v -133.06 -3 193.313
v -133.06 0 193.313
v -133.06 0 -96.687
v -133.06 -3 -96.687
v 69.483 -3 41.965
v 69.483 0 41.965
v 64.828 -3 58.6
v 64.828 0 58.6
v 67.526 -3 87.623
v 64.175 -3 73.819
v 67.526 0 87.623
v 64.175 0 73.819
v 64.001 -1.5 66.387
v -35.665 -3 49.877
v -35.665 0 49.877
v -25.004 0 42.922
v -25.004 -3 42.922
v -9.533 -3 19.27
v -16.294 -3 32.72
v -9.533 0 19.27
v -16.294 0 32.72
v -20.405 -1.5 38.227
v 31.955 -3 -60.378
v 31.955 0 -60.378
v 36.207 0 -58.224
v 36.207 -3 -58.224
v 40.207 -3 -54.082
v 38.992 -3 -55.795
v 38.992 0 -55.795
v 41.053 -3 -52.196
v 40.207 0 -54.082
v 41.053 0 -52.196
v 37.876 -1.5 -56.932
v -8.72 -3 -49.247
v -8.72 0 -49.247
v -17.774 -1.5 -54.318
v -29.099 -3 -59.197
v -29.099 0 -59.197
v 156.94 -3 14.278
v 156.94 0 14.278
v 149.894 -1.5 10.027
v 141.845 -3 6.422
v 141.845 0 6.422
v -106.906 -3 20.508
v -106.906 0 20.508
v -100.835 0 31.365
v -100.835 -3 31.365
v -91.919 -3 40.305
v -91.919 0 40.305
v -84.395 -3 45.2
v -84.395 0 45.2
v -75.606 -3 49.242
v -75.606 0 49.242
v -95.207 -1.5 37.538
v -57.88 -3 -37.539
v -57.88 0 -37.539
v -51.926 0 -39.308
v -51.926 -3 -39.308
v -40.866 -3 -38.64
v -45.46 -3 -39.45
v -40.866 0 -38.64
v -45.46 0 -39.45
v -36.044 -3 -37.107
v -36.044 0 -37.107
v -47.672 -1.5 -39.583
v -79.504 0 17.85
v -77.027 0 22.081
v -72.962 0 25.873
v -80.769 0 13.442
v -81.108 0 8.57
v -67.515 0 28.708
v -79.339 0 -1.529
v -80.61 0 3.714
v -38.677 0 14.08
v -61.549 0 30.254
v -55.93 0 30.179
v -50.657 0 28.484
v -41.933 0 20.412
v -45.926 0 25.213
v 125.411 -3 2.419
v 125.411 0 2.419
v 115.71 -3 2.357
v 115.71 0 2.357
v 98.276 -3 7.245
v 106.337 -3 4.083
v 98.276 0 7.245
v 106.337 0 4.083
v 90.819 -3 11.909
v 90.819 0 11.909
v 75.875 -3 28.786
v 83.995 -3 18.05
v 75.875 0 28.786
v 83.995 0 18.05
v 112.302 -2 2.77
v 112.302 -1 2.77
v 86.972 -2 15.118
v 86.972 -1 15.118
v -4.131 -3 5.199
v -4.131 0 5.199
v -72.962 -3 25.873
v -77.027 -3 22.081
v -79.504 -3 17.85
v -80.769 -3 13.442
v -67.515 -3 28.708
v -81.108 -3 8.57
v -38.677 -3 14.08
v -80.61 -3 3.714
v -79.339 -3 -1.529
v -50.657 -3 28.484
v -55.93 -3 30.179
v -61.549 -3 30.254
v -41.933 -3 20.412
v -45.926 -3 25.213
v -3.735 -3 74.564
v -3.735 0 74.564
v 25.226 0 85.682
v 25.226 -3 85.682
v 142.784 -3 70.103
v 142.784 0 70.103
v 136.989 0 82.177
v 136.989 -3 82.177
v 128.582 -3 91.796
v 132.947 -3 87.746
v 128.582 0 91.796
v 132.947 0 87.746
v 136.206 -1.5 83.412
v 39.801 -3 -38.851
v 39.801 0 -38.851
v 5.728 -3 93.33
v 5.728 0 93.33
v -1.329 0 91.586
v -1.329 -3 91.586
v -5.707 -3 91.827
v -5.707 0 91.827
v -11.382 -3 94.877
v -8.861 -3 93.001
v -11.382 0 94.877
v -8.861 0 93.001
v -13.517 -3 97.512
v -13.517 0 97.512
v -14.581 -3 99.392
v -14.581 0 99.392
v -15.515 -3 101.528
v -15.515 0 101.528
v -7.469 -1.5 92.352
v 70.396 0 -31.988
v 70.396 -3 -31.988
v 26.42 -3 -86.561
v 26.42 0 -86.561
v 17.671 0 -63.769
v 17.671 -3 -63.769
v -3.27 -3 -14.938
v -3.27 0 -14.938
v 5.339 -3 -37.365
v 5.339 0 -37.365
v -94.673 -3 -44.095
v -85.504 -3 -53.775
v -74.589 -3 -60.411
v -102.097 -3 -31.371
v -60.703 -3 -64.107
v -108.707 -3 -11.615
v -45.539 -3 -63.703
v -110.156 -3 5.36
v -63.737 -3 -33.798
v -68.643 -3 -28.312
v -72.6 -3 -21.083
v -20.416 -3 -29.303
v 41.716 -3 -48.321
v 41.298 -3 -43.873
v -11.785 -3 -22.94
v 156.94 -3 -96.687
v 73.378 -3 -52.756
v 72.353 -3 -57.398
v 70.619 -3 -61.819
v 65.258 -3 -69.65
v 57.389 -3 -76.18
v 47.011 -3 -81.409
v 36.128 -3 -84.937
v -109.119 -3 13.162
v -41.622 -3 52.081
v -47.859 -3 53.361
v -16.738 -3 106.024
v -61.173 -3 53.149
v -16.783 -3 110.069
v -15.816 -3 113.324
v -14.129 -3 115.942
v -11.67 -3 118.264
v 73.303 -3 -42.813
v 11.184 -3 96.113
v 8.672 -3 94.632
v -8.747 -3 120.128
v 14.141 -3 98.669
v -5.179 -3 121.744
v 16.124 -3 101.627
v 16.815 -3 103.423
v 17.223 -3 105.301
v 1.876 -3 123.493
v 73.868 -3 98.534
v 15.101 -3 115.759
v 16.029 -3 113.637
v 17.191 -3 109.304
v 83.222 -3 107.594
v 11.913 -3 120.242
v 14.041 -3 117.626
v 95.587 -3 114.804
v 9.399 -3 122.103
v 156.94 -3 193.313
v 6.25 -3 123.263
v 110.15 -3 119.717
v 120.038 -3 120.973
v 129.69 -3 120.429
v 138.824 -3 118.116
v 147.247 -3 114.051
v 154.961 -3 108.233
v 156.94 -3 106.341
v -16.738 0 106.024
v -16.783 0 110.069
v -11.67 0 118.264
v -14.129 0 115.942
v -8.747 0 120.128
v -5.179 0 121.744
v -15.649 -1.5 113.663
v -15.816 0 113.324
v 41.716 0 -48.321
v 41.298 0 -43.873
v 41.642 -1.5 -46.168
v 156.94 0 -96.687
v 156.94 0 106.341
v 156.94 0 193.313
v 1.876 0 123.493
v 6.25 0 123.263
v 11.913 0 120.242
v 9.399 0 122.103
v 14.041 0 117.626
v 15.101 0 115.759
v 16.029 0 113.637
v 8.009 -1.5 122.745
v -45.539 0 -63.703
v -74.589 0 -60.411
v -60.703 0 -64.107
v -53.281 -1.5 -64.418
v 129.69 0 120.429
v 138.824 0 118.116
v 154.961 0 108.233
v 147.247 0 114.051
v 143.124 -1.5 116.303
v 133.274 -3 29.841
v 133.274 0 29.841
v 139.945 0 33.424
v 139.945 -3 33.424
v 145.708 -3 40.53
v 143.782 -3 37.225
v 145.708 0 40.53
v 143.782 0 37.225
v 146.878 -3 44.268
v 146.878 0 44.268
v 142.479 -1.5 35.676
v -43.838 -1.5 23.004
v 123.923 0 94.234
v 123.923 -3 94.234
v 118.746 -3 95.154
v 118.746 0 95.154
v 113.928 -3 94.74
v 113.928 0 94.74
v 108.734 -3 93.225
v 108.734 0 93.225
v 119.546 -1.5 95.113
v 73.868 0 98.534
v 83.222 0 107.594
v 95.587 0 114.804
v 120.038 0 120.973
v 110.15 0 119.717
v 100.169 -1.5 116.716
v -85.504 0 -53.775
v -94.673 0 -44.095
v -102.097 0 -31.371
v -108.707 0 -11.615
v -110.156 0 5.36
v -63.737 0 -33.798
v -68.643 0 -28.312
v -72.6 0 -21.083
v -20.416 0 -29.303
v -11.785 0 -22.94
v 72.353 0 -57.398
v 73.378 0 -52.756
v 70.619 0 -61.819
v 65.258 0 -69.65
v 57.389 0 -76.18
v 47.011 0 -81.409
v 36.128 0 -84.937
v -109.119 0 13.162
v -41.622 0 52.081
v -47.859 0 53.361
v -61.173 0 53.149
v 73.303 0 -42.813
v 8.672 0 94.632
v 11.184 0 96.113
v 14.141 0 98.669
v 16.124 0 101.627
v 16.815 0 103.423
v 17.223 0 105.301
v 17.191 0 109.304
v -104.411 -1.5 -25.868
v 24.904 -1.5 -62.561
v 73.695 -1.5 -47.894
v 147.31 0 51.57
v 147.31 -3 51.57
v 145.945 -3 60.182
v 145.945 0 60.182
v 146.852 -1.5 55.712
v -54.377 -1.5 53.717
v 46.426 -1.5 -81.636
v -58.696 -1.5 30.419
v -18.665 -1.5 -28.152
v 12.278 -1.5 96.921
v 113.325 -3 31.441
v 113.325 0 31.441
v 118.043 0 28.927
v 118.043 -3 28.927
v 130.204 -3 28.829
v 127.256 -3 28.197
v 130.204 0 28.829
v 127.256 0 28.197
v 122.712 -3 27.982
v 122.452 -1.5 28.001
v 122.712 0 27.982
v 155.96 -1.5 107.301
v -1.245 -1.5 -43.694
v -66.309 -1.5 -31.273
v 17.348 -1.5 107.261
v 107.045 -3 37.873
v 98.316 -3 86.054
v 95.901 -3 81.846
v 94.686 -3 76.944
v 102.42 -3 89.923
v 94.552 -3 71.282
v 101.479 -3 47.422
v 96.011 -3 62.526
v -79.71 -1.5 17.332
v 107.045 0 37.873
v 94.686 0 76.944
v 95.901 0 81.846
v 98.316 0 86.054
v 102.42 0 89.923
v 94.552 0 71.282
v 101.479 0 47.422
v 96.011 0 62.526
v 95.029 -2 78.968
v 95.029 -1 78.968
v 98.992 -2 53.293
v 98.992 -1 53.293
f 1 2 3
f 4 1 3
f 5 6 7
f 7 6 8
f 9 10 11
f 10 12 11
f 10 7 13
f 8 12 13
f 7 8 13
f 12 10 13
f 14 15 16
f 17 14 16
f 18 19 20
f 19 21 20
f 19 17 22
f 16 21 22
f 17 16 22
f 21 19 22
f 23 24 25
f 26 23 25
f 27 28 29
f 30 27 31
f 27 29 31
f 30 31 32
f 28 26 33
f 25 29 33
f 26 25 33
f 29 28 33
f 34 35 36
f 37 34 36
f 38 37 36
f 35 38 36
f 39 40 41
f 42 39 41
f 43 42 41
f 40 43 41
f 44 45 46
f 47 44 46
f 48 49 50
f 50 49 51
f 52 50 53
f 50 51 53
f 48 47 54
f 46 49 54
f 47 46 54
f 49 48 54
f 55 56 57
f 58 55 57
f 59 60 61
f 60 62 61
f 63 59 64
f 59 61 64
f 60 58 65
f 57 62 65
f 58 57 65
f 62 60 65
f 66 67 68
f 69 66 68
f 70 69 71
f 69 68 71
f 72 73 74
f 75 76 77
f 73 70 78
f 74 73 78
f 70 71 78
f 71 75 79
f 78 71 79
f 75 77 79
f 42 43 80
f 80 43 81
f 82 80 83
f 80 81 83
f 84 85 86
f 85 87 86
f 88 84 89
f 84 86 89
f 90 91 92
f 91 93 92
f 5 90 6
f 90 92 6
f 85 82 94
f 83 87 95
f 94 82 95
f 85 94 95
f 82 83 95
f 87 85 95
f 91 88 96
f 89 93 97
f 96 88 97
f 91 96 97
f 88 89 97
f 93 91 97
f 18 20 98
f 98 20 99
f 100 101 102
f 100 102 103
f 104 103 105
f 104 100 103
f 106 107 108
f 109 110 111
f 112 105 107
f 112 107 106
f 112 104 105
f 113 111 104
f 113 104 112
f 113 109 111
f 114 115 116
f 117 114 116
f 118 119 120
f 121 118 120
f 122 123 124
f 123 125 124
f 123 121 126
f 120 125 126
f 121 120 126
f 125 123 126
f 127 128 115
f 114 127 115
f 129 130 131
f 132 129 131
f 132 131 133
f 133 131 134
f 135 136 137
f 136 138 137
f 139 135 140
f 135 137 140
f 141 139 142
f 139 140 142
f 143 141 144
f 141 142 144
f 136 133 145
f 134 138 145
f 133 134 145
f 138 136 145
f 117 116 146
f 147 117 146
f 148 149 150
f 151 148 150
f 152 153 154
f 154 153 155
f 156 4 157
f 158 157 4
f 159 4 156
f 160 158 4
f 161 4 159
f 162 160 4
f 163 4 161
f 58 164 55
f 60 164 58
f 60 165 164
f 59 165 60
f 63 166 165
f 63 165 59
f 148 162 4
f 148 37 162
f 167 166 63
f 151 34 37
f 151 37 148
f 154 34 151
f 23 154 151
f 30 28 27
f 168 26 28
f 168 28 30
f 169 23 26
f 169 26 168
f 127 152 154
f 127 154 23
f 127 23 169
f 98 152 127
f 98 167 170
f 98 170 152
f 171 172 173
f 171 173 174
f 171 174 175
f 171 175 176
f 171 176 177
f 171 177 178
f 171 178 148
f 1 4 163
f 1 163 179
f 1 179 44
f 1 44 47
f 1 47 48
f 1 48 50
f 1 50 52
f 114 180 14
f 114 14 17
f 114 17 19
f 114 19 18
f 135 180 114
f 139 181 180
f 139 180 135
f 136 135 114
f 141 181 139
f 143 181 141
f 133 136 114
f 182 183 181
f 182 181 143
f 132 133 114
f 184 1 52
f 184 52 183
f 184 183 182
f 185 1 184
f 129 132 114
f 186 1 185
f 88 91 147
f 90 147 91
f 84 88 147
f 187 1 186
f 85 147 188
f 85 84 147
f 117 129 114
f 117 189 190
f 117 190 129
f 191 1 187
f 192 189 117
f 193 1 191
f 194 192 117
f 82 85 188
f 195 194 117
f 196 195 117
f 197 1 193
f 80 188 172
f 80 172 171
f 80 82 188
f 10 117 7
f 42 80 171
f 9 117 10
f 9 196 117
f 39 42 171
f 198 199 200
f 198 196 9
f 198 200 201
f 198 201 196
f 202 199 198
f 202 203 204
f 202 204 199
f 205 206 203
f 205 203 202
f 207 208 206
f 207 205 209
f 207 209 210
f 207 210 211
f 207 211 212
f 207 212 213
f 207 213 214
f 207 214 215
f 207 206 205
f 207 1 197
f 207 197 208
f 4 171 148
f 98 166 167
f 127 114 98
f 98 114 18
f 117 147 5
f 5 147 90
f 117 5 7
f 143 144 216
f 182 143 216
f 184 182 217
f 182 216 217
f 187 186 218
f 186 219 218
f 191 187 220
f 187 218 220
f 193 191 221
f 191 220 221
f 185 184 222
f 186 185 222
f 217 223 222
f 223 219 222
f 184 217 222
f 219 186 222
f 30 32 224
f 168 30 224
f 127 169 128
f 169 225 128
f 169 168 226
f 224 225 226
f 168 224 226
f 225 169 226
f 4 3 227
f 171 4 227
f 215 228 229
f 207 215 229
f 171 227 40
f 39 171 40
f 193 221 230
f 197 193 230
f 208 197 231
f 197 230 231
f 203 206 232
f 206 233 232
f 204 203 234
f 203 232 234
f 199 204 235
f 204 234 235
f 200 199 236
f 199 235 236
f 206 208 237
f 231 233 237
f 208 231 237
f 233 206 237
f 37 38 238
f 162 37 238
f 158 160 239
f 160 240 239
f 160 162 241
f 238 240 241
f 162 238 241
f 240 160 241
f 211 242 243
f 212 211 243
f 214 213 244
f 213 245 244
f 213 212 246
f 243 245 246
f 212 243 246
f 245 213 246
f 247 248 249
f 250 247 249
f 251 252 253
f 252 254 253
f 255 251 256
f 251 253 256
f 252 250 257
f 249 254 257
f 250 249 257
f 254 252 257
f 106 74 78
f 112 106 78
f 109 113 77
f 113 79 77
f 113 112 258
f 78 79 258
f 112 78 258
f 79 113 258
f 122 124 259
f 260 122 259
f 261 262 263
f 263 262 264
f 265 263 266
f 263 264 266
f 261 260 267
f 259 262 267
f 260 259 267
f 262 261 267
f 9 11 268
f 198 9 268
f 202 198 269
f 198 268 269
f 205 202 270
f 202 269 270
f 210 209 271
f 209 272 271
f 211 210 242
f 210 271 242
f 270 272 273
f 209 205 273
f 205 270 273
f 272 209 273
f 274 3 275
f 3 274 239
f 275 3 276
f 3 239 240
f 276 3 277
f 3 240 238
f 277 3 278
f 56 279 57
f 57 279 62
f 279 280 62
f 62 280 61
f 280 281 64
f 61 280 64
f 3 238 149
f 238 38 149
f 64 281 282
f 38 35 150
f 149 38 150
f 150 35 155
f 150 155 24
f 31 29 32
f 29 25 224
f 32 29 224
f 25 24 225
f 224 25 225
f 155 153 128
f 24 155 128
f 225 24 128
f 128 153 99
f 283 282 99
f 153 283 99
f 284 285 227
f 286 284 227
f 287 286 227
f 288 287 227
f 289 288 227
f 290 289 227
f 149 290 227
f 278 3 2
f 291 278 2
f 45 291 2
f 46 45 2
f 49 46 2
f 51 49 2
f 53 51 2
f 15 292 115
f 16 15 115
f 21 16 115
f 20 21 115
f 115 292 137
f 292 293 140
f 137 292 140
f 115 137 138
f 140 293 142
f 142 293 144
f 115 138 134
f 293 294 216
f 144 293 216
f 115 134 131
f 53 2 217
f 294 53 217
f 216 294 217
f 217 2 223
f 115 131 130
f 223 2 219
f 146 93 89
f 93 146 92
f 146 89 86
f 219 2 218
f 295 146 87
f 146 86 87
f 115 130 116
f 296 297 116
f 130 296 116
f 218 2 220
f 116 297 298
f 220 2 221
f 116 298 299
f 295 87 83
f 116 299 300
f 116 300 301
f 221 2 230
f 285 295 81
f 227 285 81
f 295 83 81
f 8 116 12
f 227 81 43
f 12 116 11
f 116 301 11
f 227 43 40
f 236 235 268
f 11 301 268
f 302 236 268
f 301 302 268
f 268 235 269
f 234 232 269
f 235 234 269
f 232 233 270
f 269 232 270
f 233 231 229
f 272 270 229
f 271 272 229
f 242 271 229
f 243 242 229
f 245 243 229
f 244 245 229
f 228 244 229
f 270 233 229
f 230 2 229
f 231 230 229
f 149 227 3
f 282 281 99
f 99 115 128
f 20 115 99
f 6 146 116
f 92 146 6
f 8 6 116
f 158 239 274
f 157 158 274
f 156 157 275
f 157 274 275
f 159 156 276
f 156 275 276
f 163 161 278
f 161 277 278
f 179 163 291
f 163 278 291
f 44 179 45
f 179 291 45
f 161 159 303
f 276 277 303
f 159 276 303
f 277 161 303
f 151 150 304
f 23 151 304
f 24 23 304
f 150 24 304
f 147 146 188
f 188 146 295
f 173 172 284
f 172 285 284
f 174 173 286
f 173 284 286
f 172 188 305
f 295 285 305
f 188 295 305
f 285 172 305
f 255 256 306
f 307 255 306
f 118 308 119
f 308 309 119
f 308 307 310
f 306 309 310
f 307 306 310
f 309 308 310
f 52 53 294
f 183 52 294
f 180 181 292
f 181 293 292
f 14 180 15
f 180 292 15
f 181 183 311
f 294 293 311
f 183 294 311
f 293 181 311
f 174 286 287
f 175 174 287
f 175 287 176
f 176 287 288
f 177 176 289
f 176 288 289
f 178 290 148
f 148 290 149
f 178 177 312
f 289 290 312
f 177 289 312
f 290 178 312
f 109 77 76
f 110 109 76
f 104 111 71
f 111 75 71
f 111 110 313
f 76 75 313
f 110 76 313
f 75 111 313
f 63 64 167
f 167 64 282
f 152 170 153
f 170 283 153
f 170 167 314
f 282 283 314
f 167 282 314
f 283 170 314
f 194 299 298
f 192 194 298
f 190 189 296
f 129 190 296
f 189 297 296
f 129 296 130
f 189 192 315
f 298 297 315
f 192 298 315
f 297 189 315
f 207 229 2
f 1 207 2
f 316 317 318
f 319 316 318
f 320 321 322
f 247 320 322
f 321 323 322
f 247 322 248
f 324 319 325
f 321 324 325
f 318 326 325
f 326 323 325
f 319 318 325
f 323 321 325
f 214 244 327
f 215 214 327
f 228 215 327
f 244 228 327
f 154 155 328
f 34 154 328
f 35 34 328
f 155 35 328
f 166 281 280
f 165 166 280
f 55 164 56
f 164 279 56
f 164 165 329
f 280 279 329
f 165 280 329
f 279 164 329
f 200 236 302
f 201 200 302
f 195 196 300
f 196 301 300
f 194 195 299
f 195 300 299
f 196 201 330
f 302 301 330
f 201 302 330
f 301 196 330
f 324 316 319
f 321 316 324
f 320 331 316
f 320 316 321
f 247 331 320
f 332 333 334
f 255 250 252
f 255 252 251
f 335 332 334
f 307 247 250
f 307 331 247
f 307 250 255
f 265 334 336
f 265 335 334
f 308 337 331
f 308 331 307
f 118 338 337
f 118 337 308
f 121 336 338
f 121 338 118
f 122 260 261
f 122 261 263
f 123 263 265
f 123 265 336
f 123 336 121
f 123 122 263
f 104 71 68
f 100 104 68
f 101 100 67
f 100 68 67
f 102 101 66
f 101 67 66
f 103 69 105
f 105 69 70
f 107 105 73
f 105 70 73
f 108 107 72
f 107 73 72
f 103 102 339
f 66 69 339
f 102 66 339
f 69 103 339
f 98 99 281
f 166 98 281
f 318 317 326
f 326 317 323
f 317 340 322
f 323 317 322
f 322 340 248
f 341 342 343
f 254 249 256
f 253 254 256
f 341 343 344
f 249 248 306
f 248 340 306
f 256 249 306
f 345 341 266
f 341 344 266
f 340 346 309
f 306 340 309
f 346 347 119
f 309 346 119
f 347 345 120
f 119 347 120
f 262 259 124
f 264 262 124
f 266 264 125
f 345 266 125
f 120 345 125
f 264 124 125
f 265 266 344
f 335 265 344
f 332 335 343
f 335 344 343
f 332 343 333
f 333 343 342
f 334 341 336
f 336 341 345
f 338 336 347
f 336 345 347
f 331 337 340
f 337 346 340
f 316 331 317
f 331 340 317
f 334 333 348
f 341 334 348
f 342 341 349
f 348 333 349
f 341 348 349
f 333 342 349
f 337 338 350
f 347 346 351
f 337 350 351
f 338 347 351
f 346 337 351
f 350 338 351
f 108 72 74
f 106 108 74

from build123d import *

# Parameters (mm, degrees)
F1_DEPTH = 3


with BuildPart() as f1:
    # F0 (on Front) → F1 (new body)
    with BuildSketch(Plane.XZ):
        with BuildLine():
            Line((156.9402193278, 193.3127623796), (-133.0597806722, 193.3127623796))
            Line((-133.0597806722, 193.3127623796), (-133.0597806722, -96.6872376204))
            Line((-133.0597806722, -96.6872376204), (156.9402193278, -96.6872376204))
            Line((156.9402193278, -96.6872376204), (156.9402193278, 14.2779064416))
            add(Edge.make_bspline(
                [(156.9402193278, 14.2779064416), (150.3960401846, 9.7043804493), (141.8449614262, 6.4219288531)],
                knots=[0.6495913367, 0.6495913367, 0.6495913367, 1, 1, 1], degree=2))
            add(Edge.make_bspline(
                [(141.8449614262, 6.4219288531), (126.5587975418, 0.5541203043), (112.3015772663, 2.7696804424)],
                knots=[0, 0, 0, 1, 1, 1], degree=2))
            add(Edge.make_bspline(
                [(112.3015772663, 2.7696804424), (98.0443569908, 4.9852405805), (86.9719498604, 15.1179921535)],
                knots=[0, 0, 0, 1, 1, 1], degree=2))
            add(Edge.make_bspline(
                [(86.9719498604, 15.1179921535), (75.89954273, 25.2507437265), (69.4834498834, 41.9652370395)],
                knots=[0, 0, 0, 1, 1, 1], degree=2))
            add(Edge.make_bspline(
                [(69.4834498834, 41.9652370395), (59.4976762893, 67.979066632), (67.5256347657, 87.623011686)],
                knots=[0, 0, 0, 1, 1, 1], degree=2))
            add(Edge.make_bspline(
                [(67.5256347657, 87.623011686), (75.5535932422, 107.2669567399), (100.169483394, 116.7161116596)],
                knots=[0, 0, 0, 1, 1, 1], degree=2))
            add(Edge.make_bspline(
                [(100.169483394, 116.7161116596), (115.4556472784, 122.5839202085), (129.6895363071, 120.429140046)],
                knots=[0, 0, 0, 1, 1, 1], degree=2))
            add(Edge.make_bspline(
                [(129.6895363071, 120.429140046), (143.9234253359, 118.2743598836), (154.9608355962, 108.2327782741)],
                knots=[0, 0, 0, 1, 1, 1], degree=2))
            add(Edge.make_bspline(
                [(154.9608355962, 108.2327782741), (155.9698376052, 107.3148114886), (156.9402193278, 106.3410792713)],
                knots=[0, 0, 0, 0.0914165538, 0.0914165538, 0.0914165538], degree=2))
            Line((156.9402193278, 106.3410792713), (156.9402193278, 193.3127623796))
        make_face()
        with BuildLine():
            add(Edge.make_bspline(
                [(-8.7196716461, -49.2474706648), (-16.6388251683, -54.4142969567), (-29.0987201834, -59.1972025333)],
                knots=[0, 0, 0, 1, 1, 1], degree=2))
            add(Edge.make_bspline(
                [(-29.0987201834, -59.1972025333), (-54.717479934, -69.0313230238), (-74.5889046434, -60.4107597844)],
                knots=[0, 0, 0, 1, 1, 1], degree=2))
            add(Edge.make_bspline(
                [(-74.5889046434, -60.4107597844), (-94.4603293529, -51.790196545), (-104.4111060769, -25.8675369161)],
                knots=[0, 0, 0, 1, 1, 1], degree=2))
            add(Edge.make_bspline(
                [(-104.4111060769, -25.8675369161), (-114.6535233849, 0.814872409), (-106.9059851223, 20.508080233)],
                knots=[0, 0, 0, 1, 1, 1], degree=2))
            add(Edge.make_bspline(
                [(-106.9059851223, 20.508080233), (-99.1584468598, 40.2012880571), (-75.6062062824, 49.2421461593)],
                knots=[0, 0, 0, 1, 1, 1], degree=2))
            add(Edge.make_bspline(
                [(-75.6062062824, 49.2421461593), (-53.1176152796, 57.8747074439), (-35.6646850497, 49.8773972036)],
                knots=[0, 0, 0, 1, 1, 1], degree=2))
            add(Edge.make_bspline(
                [(-35.6646850497, 49.8773972036), (-18.2117548197, 41.8800869633), (-9.5325310417, 19.2699360091)],
                knots=[0, 0, 0, 1, 1, 1], degree=2))
            Line((-9.5325310417, 19.2699360091), (-4.1313474271, 5.1993716384))
            Line((-4.1313474271, 5.1993716384), (-72.5999900345, -21.0832777863))
            add(Edge.make_bspline(
                [(-72.5999900345, -21.0832777863), (-67.3775071458, -33.2349628763), (-57.8799977559, -37.5391148487)],
                knots=[0, 0, 0, 1, 1, 1], degree=2))
            add(Edge.make_bspline(
                [(-57.8799977559, -37.5391148487), (-48.382488366, -41.8432668212), (-36.0441533023, -37.107023738)],
                knots=[0, 0, 0, 1, 1, 1], degree=2))
            add(Edge.make_bspline(
                [(-36.0441533023, -37.107023738), (-26.4409171443, -33.420686757), (-18.6654288907, -28.1521023899)],
                knots=[0, 0, 0, 1, 1, 1], degree=2))
            add(Edge.make_bspline(
                [(-18.6654288907, -28.1521023899), (-10.8899406371, -22.8835180228), (-3.270454121, -14.9376790261)],
                knots=[0, 0, 0, 1, 1, 1], degree=2))
            Line((-3.270454121, -14.9376790261), (5.3387759169, -37.3654900533))
            add(Edge.make_bspline(
                [(5.3387759169, -37.3654900533), (-0.8005181238, -44.0806443729), (-8.7196716461, -49.2474706648)],
                knots=[0, 0, 0, 1, 1, 1], degree=2))
        make_face(mode=Mode.SUBTRACT)
        with BuildLine():
            add(Edge.make_bspline(
                [(70.6191115949, -61.8192785463), (64.3565537639, -74.7533855956), (46.4264609373, -81.6361033766)],
                knots=[0, 0, 0, 1, 1, 1], degree=2))
            add(Edge.make_bspline(
                [(46.4264609373, -81.6361033766), (35.3037253872, -85.9057215255), (26.4199643274, -86.5613058057)],
                knots=[0, 0, 0, 1, 1, 1], degree=2))
            Line((26.4199643274, -86.5613058057), (17.6707468092, -63.7688149244))
            add(Edge.make_bspline(
                [(17.6707468092, -63.7688149244), (24.9957015602, -63.049108303), (31.9550087759, -60.3776805541)],
                knots=[0, 0, 0, 1, 1, 1], degree=2))
            add(Edge.make_bspline(
                [(31.9550087759, -60.3776805541), (39.248605858, -57.5779309483), (41.0528681668, -52.1955933908)],
                knots=[0, 0, 0, 1, 1, 1], degree=2))
            add(Edge.make_bspline(
                [(41.0528681668, -52.1955933908), (42.8571304756, -46.8132558334), (39.8007371559, -38.8510790189)],
                knots=[0, 0, 0, 1, 1, 1], degree=2))
            Line((39.8007371559, -38.8510790189), (-3.7353692146, 74.5643556063))
            Line((-3.7353692146, 74.5643556063), (25.2262891985, 85.6816946661))
            Line((25.2262891985, 85.6816946661), (70.3955828391, -31.988338257))
            add(Edge.make_bspline(
                [(70.3955828391, -31.988338257), (76.881669426, -48.885171497), (70.6191115949, -61.8192785463)],
                knots=[0, 0, 0, 1, 1, 1], degree=2))
        make_face(mode=Mode.SUBTRACT)
        with BuildLine():
            add(Edge.make_bspline(
                [(5.7281644365, 93.3297782946), (-10.0442392533, 87.275319772), (-15.515416608, 101.5282240697)],
                knots=[0, 0, 0, 1, 1, 1], degree=2))
            add(Edge.make_bspline(
                [(-15.515416608, 101.5282240697), (-20.9515970927, 115.689958404), (-5.1791934028, 121.7444169266)],
                knots=[0, 0, 0, 1, 1, 1], degree=2))
            add(Edge.make_bspline(
                [(-5.1791934028, 121.7444169266), (10.593210287, 127.7988754491), (16.0293907717, 113.6371411149)],
                knots=[0, 0, 0, 1, 1, 1], degree=2))
            add(Edge.make_bspline(
                [(16.0293907717, 113.6371411149), (18.619159157, 106.890563814), (16.1243602162, 101.6267020908)],
                knots=[0, 0, 0, 1, 1, 1], degree=2))
            add(Edge.make_bspline(
                [(16.1243602162, 101.6267020908), (13.6295612754, 96.3628403675), (5.7281644365, 93.3297782946)],
                knots=[0, 0, 0, 1, 1, 1], degree=2))
        make_face(mode=Mode.SUBTRACT)
    extrude(amount=F1_DEPTH)


with BuildPart() as f1b:
    # F0 (on Front) → F1, piece 2 (new body)
    with BuildSketch(Plane.XZ):
        with BuildLine():
            add(Edge.make_bspline(
                [(-50.6571898824, 28.4840153121), (-58.3064074029, 32.2424120201), (-67.5145737189, 28.7077281427)],
                knots=[0, 0, 0, 1, 1, 1], degree=2))
            add(Edge.make_bspline(
                [(-67.5145737189, 28.7077281427), (-76.722740035, 25.1730442654), (-79.7100182591, 17.3316793823)],
                knots=[0, 0, 0, 1, 1, 1], degree=2))
            add(Edge.make_bspline(
                [(-79.7100182591, 17.3316793823), (-82.6972964832, 9.4903144992), (-79.339081134, -1.5289917929)],
                knots=[0, 0, 0, 1, 1, 1], degree=2))
            Line((-79.339081134, -1.5289917929), (-38.6772774018, 14.0796122596))
            add(Edge.make_bspline(
                [(-38.6772774018, 14.0796122596), (-43.0079723619, 24.7256186042), (-50.6571898824, 28.4840153121)],
                knots=[0, 0, 0, 1, 1, 1], degree=2))
        make_face()
    extrude(amount=F1_DEPTH)


with BuildPart() as f1c:
    # F0 (on Front) → F1, piece 3 (new body)
    with BuildSketch(Plane.XZ):
        with BuildLine():
            add(Edge.make_bspline(
                [(95.028849804, 78.9682381837), (92.902672685, 69.1561309731), (98.9921280777, 53.2925573197)],
                knots=[0, 0, 0, 1, 1, 1], degree=2))
            add(Edge.make_bspline(
                [(98.9921280777, 53.2925573197), (105.0465866003, 37.5201536299), (113.3253025287, 31.4406006404)],
                knots=[0, 0, 0, 1, 1, 1], degree=2))
            add(Edge.make_bspline(
                [(113.3253025287, 31.4406006404), (121.6040184572, 25.3610476509), (133.2737737884, 29.8406470202)],
                knots=[0, 0, 0, 1, 1, 1], degree=2))
            add(Edge.make_bspline(
                [(133.2737737884, 29.8406470202), (144.8827491439, 34.2969151428), (146.8781525471, 44.2680310337)],
                knots=[0, 0, 0, 1, 1, 1], degree=2))
            add(Edge.make_bspline(
                [(146.8781525471, 44.2680310337), (148.8735559502, 54.2391469246), (142.7841005576, 70.102720578)],
                knots=[0, 0, 0, 1, 1, 1], degree=2))
            add(Edge.make_bspline(
                [(142.7841005576, 70.102720578), (136.729642035, 85.8751242679), (128.5816998224, 91.795668577)],
                knots=[0, 0, 0, 1, 1, 1], degree=2))
            add(Edge.make_bspline(
                [(128.5816998224, 91.795668577), (120.4337576097, 97.7162128862), (108.7336122907, 93.2249478935)],
                knots=[0, 0, 0, 1, 1, 1], degree=2))
            add(Edge.make_bspline(
                [(108.7336122907, 93.2249478935), (97.155026923, 88.7803453943), (95.028849804, 78.9682381837)],
                knots=[0, 0, 0, 1, 1, 1], degree=2))
        make_face()
    extrude(amount=F1_DEPTH)


solid = Compound([f1.part, f1b.part, f1c.part])
